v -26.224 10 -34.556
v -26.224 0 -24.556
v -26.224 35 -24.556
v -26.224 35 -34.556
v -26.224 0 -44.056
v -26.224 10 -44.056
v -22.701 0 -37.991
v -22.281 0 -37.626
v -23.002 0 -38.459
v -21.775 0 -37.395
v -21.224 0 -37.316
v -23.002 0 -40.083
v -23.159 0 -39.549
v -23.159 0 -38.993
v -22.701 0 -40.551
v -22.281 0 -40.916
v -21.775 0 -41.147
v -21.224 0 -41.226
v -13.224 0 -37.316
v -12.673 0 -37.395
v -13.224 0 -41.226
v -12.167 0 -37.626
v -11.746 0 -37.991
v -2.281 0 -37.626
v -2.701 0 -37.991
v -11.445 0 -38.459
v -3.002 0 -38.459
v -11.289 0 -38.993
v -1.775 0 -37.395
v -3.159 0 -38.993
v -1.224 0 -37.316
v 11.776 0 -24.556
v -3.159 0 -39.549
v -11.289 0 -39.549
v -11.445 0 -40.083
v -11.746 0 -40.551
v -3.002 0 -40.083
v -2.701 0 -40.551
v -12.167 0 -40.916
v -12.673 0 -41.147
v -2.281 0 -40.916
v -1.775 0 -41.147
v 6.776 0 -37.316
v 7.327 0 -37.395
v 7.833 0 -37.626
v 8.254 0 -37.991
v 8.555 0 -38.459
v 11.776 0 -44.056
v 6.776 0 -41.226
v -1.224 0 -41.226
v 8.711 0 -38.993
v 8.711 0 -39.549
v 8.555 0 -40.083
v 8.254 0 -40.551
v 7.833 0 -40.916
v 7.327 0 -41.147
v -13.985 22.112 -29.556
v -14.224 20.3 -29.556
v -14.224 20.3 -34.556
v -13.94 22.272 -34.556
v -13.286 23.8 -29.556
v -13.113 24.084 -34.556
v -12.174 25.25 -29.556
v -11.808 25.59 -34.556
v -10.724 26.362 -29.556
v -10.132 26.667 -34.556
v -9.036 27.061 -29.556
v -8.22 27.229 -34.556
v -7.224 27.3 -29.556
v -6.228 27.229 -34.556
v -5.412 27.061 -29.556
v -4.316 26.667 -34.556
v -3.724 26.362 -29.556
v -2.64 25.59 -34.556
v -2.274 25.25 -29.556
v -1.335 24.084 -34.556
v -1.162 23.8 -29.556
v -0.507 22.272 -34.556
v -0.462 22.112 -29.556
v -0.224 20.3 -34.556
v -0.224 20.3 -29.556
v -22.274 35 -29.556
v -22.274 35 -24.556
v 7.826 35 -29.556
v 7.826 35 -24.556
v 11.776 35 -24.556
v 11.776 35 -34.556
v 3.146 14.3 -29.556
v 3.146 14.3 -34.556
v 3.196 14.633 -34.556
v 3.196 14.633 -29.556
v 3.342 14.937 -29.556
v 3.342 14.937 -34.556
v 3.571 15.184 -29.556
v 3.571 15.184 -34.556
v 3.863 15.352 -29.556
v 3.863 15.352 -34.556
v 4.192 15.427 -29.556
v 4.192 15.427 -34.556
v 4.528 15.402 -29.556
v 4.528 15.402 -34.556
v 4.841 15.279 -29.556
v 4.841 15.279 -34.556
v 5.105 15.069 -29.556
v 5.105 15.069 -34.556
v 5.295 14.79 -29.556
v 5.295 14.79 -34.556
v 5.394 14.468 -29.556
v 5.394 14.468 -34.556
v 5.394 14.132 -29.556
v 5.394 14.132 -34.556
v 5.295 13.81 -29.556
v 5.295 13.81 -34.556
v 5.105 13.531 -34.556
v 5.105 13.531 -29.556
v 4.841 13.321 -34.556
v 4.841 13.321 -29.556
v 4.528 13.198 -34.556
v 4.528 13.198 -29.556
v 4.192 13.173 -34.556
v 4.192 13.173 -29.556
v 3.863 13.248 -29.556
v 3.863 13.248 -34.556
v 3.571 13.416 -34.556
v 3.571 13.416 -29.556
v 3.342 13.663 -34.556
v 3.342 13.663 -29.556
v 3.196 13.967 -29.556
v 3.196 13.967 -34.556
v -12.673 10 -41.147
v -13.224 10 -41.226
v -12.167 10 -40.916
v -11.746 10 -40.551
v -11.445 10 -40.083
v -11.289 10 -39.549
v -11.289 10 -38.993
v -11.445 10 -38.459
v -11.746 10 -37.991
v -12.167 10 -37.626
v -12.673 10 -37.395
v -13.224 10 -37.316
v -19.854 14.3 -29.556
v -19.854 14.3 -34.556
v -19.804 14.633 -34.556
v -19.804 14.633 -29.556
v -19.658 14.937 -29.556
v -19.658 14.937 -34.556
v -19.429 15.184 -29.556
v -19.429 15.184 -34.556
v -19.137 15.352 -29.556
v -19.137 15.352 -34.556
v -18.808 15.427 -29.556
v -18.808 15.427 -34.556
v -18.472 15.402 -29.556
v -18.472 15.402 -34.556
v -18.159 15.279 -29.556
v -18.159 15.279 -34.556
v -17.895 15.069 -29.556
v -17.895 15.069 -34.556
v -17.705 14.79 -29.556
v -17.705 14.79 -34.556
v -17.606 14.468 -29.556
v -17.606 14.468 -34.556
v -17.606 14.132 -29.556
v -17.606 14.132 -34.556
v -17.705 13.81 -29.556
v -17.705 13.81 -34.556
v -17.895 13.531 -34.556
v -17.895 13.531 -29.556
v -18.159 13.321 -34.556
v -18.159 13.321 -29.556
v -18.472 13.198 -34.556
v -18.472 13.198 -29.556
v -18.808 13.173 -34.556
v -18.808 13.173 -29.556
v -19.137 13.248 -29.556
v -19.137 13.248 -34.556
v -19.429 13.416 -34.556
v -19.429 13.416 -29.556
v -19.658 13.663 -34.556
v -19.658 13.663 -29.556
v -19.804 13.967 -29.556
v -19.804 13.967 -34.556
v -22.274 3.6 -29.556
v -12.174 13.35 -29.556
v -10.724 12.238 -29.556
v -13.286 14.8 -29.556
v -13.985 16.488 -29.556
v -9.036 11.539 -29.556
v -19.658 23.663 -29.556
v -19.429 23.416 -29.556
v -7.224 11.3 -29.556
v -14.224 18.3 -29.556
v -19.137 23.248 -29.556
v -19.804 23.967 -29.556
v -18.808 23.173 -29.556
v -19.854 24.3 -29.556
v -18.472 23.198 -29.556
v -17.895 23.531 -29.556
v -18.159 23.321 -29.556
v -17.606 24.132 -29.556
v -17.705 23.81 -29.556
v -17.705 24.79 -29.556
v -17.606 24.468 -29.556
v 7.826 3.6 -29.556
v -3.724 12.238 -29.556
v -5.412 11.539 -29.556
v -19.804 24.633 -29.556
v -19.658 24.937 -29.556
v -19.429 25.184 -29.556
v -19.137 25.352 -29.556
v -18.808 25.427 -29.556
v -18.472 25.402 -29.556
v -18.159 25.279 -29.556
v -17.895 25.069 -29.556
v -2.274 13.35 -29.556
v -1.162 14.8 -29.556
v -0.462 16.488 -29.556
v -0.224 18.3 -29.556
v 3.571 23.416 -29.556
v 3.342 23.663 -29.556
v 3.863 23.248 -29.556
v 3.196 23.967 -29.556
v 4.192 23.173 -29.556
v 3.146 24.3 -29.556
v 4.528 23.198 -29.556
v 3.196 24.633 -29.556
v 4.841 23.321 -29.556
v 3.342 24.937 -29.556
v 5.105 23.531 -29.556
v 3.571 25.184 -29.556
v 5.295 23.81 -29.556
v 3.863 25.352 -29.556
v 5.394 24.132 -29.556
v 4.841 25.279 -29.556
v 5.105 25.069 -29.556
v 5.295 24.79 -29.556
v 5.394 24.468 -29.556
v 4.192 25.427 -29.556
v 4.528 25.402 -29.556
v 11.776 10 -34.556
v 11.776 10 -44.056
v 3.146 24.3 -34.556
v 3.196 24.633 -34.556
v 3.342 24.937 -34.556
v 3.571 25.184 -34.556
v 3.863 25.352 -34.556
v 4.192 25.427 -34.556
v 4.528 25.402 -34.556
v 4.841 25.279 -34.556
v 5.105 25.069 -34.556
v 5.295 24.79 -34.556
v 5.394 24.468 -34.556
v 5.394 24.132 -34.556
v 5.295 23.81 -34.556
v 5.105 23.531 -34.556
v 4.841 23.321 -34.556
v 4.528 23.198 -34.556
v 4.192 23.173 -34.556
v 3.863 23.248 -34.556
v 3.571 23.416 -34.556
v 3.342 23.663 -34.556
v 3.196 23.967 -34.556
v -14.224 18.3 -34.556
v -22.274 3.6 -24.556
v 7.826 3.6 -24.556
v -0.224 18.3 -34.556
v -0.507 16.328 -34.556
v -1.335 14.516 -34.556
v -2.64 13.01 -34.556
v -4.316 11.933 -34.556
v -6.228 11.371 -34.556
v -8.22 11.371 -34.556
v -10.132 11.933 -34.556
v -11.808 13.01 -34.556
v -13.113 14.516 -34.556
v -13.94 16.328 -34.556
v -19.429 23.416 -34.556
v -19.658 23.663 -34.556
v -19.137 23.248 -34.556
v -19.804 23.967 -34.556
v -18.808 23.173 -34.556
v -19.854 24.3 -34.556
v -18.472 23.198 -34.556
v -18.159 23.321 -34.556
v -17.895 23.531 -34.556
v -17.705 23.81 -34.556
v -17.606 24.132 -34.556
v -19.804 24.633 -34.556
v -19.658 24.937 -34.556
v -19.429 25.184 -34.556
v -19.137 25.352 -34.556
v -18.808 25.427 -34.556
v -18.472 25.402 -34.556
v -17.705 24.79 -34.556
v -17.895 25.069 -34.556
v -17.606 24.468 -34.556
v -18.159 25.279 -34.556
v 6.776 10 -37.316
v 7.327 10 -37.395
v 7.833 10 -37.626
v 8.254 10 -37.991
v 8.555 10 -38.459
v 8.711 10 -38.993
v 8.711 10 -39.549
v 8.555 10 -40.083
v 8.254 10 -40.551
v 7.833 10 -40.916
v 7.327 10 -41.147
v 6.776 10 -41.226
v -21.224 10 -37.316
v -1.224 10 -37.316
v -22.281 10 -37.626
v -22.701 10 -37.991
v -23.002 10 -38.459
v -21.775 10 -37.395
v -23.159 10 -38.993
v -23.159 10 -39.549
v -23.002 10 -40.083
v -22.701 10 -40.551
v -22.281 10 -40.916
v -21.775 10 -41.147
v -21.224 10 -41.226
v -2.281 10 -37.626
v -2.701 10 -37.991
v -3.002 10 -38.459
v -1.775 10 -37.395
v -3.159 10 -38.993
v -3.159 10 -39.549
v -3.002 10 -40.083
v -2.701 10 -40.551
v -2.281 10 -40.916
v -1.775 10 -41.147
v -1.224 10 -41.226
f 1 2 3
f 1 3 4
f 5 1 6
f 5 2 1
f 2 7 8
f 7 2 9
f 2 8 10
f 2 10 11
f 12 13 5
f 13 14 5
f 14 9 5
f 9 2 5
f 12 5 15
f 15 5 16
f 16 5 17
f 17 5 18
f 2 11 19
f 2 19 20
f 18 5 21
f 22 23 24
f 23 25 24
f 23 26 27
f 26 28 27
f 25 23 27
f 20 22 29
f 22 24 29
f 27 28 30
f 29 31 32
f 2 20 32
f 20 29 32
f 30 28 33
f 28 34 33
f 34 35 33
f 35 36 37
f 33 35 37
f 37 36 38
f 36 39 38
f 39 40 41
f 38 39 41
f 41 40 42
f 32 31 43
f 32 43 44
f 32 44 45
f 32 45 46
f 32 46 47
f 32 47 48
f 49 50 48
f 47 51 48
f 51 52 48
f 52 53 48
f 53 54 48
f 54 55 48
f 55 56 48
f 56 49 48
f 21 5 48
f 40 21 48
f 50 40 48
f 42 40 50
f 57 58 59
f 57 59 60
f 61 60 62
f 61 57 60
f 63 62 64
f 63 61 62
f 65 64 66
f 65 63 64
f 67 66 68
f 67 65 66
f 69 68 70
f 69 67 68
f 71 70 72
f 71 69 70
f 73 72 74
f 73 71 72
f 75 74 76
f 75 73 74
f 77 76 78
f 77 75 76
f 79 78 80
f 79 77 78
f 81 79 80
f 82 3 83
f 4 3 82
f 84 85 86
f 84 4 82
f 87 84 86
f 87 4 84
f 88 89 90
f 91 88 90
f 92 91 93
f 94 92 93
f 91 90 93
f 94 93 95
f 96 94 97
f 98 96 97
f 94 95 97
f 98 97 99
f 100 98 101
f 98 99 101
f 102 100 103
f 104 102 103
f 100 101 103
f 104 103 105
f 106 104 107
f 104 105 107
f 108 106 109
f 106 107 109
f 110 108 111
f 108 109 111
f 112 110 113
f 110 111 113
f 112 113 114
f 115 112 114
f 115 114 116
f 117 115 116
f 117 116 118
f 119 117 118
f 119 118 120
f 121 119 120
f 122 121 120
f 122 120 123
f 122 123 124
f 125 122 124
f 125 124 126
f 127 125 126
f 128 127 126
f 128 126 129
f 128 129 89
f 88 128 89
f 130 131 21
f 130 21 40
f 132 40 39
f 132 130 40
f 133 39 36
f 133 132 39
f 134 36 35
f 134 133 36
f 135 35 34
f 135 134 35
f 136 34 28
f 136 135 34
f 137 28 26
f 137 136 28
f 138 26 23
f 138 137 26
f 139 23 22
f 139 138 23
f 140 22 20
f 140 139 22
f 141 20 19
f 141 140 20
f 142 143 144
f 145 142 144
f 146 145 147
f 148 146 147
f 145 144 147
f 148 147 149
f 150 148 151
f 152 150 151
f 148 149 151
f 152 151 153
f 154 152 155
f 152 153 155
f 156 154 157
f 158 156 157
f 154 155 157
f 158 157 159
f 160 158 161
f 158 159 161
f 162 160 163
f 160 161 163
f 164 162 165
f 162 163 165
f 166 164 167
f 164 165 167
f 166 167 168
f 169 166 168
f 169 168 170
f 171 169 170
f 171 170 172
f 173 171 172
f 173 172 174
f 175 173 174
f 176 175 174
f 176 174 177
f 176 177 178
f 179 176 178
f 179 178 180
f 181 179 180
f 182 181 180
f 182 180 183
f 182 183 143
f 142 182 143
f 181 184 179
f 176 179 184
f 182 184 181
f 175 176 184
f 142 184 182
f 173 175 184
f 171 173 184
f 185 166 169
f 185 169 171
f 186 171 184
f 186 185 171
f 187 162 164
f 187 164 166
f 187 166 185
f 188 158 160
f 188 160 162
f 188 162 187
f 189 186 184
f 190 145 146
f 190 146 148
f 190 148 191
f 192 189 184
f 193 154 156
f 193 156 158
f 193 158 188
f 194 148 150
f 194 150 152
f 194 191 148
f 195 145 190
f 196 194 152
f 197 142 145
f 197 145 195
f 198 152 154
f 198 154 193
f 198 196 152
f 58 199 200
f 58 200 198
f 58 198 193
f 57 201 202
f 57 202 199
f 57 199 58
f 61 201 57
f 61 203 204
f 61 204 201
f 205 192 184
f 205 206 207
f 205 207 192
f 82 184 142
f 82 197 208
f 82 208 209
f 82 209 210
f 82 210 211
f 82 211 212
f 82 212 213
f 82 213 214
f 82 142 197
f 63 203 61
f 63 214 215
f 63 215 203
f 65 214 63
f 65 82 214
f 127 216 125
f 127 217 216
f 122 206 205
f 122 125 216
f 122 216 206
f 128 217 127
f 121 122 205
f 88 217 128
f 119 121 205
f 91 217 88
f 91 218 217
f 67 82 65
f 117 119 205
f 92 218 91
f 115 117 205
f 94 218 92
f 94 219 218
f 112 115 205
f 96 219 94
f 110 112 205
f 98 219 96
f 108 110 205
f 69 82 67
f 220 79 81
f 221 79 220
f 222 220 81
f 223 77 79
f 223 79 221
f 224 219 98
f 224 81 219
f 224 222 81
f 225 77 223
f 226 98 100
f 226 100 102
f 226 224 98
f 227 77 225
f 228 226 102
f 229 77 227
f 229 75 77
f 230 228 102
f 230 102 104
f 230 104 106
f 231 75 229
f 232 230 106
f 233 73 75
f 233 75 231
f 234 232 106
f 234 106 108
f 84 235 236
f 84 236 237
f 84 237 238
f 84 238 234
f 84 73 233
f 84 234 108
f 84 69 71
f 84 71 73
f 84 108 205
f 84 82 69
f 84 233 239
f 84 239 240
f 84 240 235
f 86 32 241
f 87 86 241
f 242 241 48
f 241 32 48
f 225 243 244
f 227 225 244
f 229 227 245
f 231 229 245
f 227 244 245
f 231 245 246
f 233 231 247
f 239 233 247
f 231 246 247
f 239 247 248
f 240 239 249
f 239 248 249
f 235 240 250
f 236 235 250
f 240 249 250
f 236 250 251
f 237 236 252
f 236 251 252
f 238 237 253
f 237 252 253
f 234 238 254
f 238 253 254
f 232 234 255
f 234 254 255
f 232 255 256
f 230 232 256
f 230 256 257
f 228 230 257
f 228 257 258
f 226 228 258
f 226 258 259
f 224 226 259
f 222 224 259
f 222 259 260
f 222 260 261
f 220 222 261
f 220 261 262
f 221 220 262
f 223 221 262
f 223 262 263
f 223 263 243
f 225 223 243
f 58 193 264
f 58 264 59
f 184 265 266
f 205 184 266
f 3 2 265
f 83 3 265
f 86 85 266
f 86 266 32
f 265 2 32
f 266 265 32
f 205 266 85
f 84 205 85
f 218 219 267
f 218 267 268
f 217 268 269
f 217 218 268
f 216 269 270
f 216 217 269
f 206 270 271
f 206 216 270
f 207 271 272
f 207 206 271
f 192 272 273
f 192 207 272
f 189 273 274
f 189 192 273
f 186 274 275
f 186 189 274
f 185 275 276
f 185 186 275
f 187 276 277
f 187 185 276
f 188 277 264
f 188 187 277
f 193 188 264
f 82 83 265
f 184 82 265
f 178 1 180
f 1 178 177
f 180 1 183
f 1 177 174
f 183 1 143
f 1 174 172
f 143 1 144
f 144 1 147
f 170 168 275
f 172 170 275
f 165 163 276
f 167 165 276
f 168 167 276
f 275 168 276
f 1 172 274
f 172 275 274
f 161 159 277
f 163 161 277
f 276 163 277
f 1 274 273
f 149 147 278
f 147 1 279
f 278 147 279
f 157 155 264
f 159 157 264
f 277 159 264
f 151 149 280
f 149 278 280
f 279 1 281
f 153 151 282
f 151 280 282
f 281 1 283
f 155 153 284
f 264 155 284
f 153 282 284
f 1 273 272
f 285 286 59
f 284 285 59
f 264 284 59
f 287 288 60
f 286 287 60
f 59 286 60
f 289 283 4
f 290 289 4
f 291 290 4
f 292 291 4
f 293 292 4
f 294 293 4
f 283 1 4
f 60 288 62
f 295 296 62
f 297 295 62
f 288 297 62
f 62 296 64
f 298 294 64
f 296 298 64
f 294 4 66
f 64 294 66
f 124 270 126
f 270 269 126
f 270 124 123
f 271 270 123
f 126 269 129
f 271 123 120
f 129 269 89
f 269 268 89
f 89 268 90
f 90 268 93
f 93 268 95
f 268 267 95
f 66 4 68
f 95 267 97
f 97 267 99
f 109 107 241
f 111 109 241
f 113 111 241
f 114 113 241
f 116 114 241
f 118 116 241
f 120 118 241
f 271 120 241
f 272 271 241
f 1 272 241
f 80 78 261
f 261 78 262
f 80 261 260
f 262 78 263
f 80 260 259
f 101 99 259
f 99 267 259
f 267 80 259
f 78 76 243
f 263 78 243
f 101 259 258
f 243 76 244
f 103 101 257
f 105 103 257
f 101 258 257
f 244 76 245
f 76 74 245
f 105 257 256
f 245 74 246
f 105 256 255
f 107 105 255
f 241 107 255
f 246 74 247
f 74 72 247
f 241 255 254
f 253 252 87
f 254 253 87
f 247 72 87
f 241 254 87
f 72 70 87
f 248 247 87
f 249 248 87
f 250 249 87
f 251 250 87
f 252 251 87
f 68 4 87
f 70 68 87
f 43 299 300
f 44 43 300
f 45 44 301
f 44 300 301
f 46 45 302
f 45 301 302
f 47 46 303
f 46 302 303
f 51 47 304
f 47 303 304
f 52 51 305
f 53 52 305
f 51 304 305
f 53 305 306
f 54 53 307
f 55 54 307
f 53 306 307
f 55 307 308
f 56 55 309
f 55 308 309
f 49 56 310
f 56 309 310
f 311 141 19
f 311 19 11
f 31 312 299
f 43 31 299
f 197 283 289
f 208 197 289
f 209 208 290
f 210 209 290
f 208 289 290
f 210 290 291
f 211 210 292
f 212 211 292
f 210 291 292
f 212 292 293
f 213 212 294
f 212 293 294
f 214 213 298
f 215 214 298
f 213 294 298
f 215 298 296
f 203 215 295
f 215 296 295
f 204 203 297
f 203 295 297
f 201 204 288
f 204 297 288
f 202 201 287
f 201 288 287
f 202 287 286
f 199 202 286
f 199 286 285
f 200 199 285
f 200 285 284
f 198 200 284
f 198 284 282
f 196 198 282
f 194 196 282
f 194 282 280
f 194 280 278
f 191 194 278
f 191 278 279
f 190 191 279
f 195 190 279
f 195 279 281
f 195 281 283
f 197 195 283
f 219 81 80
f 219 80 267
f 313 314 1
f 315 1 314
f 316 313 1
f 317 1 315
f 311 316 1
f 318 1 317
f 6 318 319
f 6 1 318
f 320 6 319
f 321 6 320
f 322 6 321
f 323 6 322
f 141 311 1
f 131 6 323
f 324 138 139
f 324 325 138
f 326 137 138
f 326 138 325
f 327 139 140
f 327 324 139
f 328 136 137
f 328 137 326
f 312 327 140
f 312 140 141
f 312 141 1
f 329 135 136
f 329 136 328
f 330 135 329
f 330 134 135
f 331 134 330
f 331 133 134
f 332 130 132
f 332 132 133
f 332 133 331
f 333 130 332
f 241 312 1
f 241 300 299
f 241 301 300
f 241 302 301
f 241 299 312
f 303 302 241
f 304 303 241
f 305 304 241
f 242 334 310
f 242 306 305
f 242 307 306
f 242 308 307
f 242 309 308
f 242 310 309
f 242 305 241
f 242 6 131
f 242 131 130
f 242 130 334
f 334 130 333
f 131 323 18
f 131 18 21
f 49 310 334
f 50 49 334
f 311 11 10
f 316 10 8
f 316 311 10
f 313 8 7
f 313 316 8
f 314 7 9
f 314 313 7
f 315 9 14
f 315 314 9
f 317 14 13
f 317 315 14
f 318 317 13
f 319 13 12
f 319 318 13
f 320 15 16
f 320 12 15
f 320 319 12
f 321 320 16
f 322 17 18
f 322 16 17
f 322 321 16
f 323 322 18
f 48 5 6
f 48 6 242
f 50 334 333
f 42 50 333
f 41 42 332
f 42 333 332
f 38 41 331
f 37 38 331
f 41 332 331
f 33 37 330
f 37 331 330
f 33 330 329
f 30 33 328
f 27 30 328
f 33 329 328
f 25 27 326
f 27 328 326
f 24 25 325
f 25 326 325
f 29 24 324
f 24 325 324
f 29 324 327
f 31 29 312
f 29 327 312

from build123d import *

# Parameters (mm, degrees)
SKETCH1_W                = 38
SKETCH1_H                = 19.5
BOSS_EXTRUDE1_DEPTH      = 35
SKETCH2_W                = 38
SKETCH2_H                = 9.5
CUT_EXTRUDE1_DEPTH       = 25
F_6_32_SLOT_REACH        = 12
APERTURE_THRU_HOLE_REACH = 21.5
SKETCH5_4_R              = 1.13
CUT_EXTRUDE5_DEPTH       = 5
F_4_40_TAPPED_HOLE1_D    = 2.2606


with BuildPart() as part:
    # Sketch1 → Boss-Extrude1 (new body)
    with BuildSketch(Plane(origin=(0, 0, 0), x_dir=(1, 0, 0), z_dir=(0, 1, 0))):
        with Locations((-7.223776224, 34.305944056)):
            Rectangle(SKETCH1_W, SKETCH1_H)
    extrude(amount=BOSS_EXTRUDE1_DEPTH)

    # Sketch2 → Cut-Extrude1 (cut)
    with BuildSketch(Plane(origin=(0, 35, 0), x_dir=(1, 0, 0), z_dir=(0, 1, 0))):
        with Locations((-7.223776224, 39.305944056)):
            Rectangle(SKETCH2_W, SKETCH2_H)
    extrude(amount=-CUT_EXTRUDE1_DEPTH, mode=Mode.SUBTRACT)

    # Sketch4 → 6-32 slot (cut, up to next)
    with BuildSketch(Plane(origin=(0, 10, 0), x_dir=(1, 0, 0), z_dir=(0, 1, 0)), mode=Mode.PRIVATE) as f_6_32_slot_sk1:
        with BuildLine():
            ThreePointArc((-13.223776224, 41.225951608), (-11.268776224, 39.270951608), (-13.223776224, 37.315951608))
            Line((-13.223776224, 37.315951608), (-21.223776224, 37.315951608))
            ThreePointArc((-21.223776224, 37.315951608), (-23.178776224, 39.270951608), (-21.223776224, 41.225951608))
            Line((-21.223776224, 41.225951608), (-13.223776224, 41.225951608))
        make_face()
    f_6_32_slot_tool1 = extrude(f_6_32_slot_sk1.sketch, amount=-F_6_32_SLOT_REACH, mode=Mode.PRIVATE) & part.part
    add(f_6_32_slot_tool1.solids().sort_by_distance((-17.223776, 10, -39.270952))[0], mode=Mode.SUBTRACT)
    # Sketch4 → 6-32 slot (cut, up to next)
    with BuildSketch(Plane(origin=(0, 10, 0), x_dir=(1, 0, 0), z_dir=(0, 1, 0)), mode=Mode.PRIVATE) as f_6_32_slot_sk2:
        with BuildLine():
            Line((6.776223776, 41.225951608), (-1.223776224, 41.225951608))
            ThreePointArc((-1.223776224, 41.225951608), (-3.178776224, 39.270951608), (-1.223776224, 37.315951608))
            Line((-1.223776224, 37.315951608), (6.776223776, 37.315951608))
            ThreePointArc((6.776223776, 37.315951608), (8.731223776, 39.270951608), (6.776223776, 41.225951608))
        make_face()
    f_6_32_slot_tool2 = extrude(f_6_32_slot_sk2.sketch, amount=-F_6_32_SLOT_REACH, mode=Mode.PRIVATE) & part.part
    add(f_6_32_slot_tool2.solids().sort_by_distance((2.776224, 10, -39.270952))[0], mode=Mode.SUBTRACT)

    # Sketch5 → aperture thru hole (cut, up to next)
    with BuildSketch(Plane.XY.offset(-24.555944056), mode=Mode.PRIVATE) as aperture_thru_hole_sk1:
        with BuildLine():
            Line((-14.223776224, 18.3), (-14.223776224, 20.3))
            ThreePointArc((-14.223776224, 20.3), (-7.223776224, 27.3), (-0.223776224, 20.3))
            Line((-0.223776224, 20.3), (-0.223776224, 18.3))
            ThreePointArc((-0.223776224, 18.3), (-7.223776224, 11.3), (-14.223776224, 18.3))
        make_face()
    aperture_thru_hole_tool1 = extrude(aperture_thru_hole_sk1.sketch, amount=-APERTURE_THRU_HOLE_REACH, mode=Mode.PRIVATE) & part.part
    add(aperture_thru_hole_tool1.solids().sort_by_distance((-7.223776, 19.3, -24.555944))[0], mode=Mode.SUBTRACT)

    # Sketch5<4> → Cut-Extrude5 (cut)
    with BuildSketch(Plane.XY.offset(-24.555944056)):
        with BuildLine():
            Line((-7.223776224, 27.3), (-7.223776224, 35))
            Line((-7.223776224, 35), (-22.273776224, 35))
            Line((-22.273776224, 35), (-22.273776224, 19.3))
            Line((-22.273776224, 19.3), (-14.223776224, 19.3))
            Line((-14.223776224, 19.3), (-14.223776224, 20.3))
            ThreePointArc((-14.223776224, 20.3), (-12.173523692, 25.249747468), (-7.223776224, 27.3))
        make_face()
        with Locations((-18.723776224, 24.3)):
            Circle(SKETCH5_4_R, mode=Mode.SUBTRACT)
        with BuildLine():
            Line((7.826223776, 35), (-7.223776224, 35))
            Line((-7.223776224, 35), (-7.223776224, 27.3))
            ThreePointArc((-7.223776224, 27.3), (-2.274028755, 25.249747468), (-0.223776224, 20.3))
            Line((-0.223776224, 20.3), (-0.223776224, 19.3))
            Line((-0.223776224, 19.3), (7.826223776, 19.3))
            Line((7.826223776, 19.3), (7.826223776, 35))
        make_face()
        with Locations((4.276223776, 24.3)):
            Circle(SKETCH5_4_R, mode=Mode.SUBTRACT)
        with BuildLine():
            Line((7.826223776, 3.6), (7.826223776, 19.3))
            Line((7.826223776, 19.3), (-0.223776224, 19.3))
            Line((-0.223776224, 19.3), (-0.223776224, 18.3))
            ThreePointArc((-0.223776224, 18.3), (-2.274028755, 13.350252532), (-7.223776224, 11.3))
            Line((-7.223776224, 11.3), (-7.223776224, 3.6))
            Line((-7.223776224, 3.6), (7.826223776, 3.6))
        make_face()
        with Locations((4.276223776, 14.3)):
            Circle(SKETCH5_4_R, mode=Mode.SUBTRACT)
        with BuildLine():
            Line((-14.223776224, 19.3), (-22.273776224, 19.3))
            Line((-22.273776224, 19.3), (-22.273776224, 3.6))
            Line((-22.273776224, 3.6), (-7.223776224, 3.6))
            Line((-7.223776224, 3.6), (-7.223776224, 11.3))
            ThreePointArc((-7.223776224, 11.3), (-12.173523692, 13.350252532), (-14.223776224, 18.3))
            Line((-14.223776224, 18.3), (-14.223776224, 19.3))
        make_face()
        with Locations((-18.723776224, 14.3)):
            Circle(SKETCH5_4_R, mode=Mode.SUBTRACT)
    extrude(amount=-CUT_EXTRUDE5_DEPTH, mode=Mode.SUBTRACT)

    # #4-40 Tapped Hole1 (through all)
    with Locations(Plane.XY.offset(-24.555944056)):
        with Locations((-18.723776224, 24.3), (-18.723776224, 14.3), (4.276223776, 14.3), (4.276223776, 24.3)):
            Hole(F_4_40_TAPPED_HOLE1_D / 2)


solid = part.part
